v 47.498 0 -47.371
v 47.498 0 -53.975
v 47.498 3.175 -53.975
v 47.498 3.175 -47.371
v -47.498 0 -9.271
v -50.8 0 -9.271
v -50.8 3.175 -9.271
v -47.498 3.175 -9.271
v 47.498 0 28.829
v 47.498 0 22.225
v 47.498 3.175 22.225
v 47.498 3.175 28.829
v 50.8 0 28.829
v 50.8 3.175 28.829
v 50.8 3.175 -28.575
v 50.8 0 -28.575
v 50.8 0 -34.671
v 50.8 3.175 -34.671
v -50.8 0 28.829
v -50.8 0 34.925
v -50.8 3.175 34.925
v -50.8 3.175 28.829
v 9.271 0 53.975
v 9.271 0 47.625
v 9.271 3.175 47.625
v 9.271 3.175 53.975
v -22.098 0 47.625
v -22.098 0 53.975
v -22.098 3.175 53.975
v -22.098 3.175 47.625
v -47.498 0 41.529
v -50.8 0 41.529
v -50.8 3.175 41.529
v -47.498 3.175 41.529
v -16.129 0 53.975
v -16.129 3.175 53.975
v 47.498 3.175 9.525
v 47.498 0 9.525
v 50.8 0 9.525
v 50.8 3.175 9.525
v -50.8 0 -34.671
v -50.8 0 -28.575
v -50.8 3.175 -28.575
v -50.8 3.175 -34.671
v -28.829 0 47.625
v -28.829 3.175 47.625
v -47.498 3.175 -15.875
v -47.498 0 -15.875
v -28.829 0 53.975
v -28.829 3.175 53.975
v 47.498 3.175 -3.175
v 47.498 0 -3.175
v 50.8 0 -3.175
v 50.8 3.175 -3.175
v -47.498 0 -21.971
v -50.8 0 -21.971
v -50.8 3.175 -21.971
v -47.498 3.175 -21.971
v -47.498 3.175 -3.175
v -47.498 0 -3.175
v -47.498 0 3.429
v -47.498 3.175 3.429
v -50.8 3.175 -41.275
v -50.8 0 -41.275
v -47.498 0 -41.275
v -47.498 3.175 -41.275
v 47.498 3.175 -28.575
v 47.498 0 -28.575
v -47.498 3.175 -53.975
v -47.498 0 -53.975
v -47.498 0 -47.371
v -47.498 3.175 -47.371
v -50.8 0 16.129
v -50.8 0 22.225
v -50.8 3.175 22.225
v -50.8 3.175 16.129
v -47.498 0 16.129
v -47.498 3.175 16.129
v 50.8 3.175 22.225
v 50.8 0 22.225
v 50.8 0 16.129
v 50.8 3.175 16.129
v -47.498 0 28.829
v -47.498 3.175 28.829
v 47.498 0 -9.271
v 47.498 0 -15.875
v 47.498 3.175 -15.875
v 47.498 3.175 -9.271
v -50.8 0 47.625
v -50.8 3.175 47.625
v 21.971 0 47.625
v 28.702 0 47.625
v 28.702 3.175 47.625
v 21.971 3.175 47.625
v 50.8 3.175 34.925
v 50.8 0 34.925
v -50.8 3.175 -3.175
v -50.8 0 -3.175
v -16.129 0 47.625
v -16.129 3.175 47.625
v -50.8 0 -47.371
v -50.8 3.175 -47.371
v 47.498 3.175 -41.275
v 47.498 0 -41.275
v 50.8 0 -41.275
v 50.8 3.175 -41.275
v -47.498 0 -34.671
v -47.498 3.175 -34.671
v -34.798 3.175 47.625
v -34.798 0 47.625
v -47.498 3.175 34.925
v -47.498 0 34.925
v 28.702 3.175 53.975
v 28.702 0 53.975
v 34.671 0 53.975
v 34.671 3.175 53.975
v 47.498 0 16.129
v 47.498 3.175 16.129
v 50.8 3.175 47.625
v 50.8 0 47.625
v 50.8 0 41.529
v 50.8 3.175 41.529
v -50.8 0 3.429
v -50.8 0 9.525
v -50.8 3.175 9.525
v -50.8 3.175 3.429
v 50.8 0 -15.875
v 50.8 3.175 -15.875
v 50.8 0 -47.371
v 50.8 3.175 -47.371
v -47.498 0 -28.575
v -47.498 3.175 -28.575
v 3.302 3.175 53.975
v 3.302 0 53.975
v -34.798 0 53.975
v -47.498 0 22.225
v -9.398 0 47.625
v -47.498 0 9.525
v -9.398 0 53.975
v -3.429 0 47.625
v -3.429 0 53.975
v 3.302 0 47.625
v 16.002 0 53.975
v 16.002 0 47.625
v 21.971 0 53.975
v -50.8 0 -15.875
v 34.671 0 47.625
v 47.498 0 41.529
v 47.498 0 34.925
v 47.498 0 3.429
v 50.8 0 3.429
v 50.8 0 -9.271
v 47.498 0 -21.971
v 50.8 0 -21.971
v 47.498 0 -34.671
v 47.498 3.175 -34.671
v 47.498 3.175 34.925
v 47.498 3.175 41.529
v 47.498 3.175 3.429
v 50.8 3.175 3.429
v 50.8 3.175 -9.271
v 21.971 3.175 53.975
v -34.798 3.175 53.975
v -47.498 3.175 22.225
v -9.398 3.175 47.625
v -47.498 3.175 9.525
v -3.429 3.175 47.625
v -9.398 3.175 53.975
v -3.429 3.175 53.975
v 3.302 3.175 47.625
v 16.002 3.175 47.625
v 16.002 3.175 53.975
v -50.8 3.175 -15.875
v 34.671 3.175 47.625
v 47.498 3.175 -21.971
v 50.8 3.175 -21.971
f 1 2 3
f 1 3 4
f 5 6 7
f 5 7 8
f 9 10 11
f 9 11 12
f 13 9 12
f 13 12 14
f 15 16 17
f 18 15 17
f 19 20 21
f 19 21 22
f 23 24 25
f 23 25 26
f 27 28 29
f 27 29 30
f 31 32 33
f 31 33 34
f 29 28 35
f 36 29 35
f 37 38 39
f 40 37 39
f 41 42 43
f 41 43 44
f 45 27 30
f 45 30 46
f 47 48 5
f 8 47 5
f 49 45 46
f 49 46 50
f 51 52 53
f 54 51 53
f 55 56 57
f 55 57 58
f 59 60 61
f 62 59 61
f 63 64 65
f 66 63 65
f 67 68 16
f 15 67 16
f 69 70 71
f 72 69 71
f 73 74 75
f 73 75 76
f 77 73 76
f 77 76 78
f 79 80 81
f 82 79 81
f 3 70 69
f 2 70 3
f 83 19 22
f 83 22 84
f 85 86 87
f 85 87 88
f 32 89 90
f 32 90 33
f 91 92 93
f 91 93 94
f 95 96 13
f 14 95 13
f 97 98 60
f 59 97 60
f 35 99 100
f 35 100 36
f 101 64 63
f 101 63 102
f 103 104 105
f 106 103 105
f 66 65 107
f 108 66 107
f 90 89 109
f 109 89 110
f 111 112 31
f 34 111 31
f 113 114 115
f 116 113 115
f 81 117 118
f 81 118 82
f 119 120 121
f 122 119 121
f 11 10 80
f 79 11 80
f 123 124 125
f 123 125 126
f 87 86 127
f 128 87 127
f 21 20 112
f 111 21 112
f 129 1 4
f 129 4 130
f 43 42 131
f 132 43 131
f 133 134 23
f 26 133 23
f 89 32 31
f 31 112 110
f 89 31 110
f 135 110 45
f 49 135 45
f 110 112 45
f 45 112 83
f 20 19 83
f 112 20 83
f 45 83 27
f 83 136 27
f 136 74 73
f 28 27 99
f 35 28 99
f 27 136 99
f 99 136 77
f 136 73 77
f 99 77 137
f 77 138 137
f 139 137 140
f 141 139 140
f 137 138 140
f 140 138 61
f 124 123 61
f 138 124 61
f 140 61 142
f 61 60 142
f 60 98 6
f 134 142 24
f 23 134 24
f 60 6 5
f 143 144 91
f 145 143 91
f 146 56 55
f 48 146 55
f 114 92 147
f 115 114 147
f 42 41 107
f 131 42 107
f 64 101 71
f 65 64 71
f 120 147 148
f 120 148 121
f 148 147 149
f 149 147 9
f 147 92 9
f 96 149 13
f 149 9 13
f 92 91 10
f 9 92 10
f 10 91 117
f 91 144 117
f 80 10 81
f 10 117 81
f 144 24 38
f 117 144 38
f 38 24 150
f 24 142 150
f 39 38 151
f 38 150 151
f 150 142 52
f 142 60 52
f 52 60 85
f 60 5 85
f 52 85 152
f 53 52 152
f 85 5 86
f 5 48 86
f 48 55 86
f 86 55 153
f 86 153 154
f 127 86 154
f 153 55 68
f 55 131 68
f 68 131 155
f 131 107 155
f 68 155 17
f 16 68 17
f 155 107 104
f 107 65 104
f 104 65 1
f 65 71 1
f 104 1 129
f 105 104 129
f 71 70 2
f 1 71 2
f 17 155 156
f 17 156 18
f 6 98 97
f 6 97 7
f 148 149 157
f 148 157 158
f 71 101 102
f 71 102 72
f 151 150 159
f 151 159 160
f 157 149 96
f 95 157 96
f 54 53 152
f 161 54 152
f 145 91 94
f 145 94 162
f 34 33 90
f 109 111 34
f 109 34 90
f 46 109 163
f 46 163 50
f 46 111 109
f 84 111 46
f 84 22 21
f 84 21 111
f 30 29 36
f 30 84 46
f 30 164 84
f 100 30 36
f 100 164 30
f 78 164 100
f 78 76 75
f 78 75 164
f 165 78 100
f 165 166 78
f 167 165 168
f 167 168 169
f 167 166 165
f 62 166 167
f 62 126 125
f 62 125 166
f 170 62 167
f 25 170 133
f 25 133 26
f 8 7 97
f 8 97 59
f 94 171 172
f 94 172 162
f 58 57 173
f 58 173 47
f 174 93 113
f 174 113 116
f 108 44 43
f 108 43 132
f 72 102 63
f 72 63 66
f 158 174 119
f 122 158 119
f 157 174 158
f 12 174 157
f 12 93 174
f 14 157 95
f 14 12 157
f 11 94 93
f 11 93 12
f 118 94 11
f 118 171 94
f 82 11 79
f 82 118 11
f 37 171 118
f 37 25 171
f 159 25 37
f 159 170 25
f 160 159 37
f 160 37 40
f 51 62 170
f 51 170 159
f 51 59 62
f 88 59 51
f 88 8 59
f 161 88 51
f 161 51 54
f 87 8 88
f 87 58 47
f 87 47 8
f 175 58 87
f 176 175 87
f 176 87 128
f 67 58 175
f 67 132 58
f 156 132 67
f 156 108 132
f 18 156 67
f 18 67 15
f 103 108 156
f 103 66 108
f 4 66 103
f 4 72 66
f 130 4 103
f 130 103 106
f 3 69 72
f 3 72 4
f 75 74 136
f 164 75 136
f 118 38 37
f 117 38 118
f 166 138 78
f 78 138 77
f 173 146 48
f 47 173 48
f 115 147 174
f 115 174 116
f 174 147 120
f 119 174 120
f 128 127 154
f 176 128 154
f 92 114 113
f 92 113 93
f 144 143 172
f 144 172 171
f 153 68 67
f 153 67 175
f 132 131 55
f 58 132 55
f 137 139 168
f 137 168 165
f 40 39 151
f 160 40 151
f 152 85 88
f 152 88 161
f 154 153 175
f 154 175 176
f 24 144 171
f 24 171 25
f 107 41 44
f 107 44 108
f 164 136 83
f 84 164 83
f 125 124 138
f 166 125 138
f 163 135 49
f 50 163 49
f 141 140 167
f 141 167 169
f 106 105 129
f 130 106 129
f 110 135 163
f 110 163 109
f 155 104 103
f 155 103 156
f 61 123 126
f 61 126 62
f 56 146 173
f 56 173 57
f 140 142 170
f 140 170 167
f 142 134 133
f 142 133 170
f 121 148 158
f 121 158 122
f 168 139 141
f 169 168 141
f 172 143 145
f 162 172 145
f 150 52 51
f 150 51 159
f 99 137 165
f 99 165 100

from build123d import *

# Parameters (mm, degrees)
SKETCH1_W           = 101.6
SKETCH1_H           = 107.95
BOSS_EXTRUDE1_DEPTH = 3.175
SKETCH2_W           = 3.302
SKETCH2_H           = 6.604
CUT_EXTRUDE1_DEPTH  = 75.189091179


with BuildPart() as part:
    # Sketch1 → Boss-Extrude1 (new body)
    with BuildSketch(Plane(origin=(0, 0, 0), x_dir=(1, 0, 0), z_dir=(0, 1, 0))):
        Rectangle(SKETCH1_W, SKETCH1_H)
    extrude(amount=BOSS_EXTRUDE1_DEPTH)

    # Sketch2 → Cut-Extrude1 (cut, through all)
    with BuildSketch(Plane.XZ):
        Polygon((-34.798, 47.625), (-47.498, 47.625), (-50.8, 47.625), (-50.8, 54.229), (-50.8, 63.03162391), (50.8, 63.03162391), (50.8, 54.229), (50.8, 47.625), (47.498, 47.625), (34.671, 47.625), (34.671, 54.229), (28.702, 54.229), (28.702, 47.625), (21.971, 47.625), (21.971, 54.229), (16.002, 54.229), (16.002, 47.625), (9.271, 47.625), (9.271, 54.229), (3.302, 54.229), (3.302, 47.625), (-3.429, 47.625), (-3.429, 54.229), (-9.398, 54.229), (-9.398, 47.625), (-16.129, 47.625), (-16.129, 54.229), (-22.098, 54.229), (-22.098, 47.625), (-28.829, 47.625), (-28.829, 54.229), (-34.798, 54.229), align=None)
        with Locations((49.149, 38.227)):
            Rectangle(SKETCH2_W, SKETCH2_H)
        with Locations((49.149, 25.527)):
            Rectangle(SKETCH2_W, SKETCH2_H)
        with Locations((49.149, 12.827)):
            Rectangle(SKETCH2_W, SKETCH2_H)
        with Locations((49.149, 0.127)):
            Rectangle(SKETCH2_W, SKETCH2_H)
        with Locations((49.149, -12.573)):
            Rectangle(SKETCH2_W, SKETCH2_H)
        with Locations((49.149, -25.273)):
            Rectangle(SKETCH2_W, SKETCH2_H)
        with Locations((49.149, -37.973)):
            Rectangle(SKETCH2_W, SKETCH2_H)
        with Locations((-49.149, -37.973)):
            Rectangle(SKETCH2_W, SKETCH2_H)
        with Locations((-49.149, -25.273)):
            Rectangle(SKETCH2_W, SKETCH2_H)
        with Locations((-49.149, -12.573)):
            Rectangle(SKETCH2_W, SKETCH2_H)
        with Locations((-49.149, 0.127)):
            Rectangle(SKETCH2_W, SKETCH2_H)
        with Locations((-49.149, 12.827)):
            Rectangle(SKETCH2_W, SKETCH2_H)
        with Locations((-49.149, 25.527)):
            Rectangle(SKETCH2_W, SKETCH2_H)
        with Locations((-49.149, 38.227)):
            Rectangle(SKETCH2_W, SKETCH2_H)
        with Locations((49.149, -50.673)):
            Rectangle(SKETCH2_W, SKETCH2_H)
        with Locations((-49.149, -50.673)):
            Rectangle(SKETCH2_W, SKETCH2_H)
    extrude(amount=-CUT_EXTRUDE1_DEPTH, mode=Mode.SUBTRACT)


solid = part.part
